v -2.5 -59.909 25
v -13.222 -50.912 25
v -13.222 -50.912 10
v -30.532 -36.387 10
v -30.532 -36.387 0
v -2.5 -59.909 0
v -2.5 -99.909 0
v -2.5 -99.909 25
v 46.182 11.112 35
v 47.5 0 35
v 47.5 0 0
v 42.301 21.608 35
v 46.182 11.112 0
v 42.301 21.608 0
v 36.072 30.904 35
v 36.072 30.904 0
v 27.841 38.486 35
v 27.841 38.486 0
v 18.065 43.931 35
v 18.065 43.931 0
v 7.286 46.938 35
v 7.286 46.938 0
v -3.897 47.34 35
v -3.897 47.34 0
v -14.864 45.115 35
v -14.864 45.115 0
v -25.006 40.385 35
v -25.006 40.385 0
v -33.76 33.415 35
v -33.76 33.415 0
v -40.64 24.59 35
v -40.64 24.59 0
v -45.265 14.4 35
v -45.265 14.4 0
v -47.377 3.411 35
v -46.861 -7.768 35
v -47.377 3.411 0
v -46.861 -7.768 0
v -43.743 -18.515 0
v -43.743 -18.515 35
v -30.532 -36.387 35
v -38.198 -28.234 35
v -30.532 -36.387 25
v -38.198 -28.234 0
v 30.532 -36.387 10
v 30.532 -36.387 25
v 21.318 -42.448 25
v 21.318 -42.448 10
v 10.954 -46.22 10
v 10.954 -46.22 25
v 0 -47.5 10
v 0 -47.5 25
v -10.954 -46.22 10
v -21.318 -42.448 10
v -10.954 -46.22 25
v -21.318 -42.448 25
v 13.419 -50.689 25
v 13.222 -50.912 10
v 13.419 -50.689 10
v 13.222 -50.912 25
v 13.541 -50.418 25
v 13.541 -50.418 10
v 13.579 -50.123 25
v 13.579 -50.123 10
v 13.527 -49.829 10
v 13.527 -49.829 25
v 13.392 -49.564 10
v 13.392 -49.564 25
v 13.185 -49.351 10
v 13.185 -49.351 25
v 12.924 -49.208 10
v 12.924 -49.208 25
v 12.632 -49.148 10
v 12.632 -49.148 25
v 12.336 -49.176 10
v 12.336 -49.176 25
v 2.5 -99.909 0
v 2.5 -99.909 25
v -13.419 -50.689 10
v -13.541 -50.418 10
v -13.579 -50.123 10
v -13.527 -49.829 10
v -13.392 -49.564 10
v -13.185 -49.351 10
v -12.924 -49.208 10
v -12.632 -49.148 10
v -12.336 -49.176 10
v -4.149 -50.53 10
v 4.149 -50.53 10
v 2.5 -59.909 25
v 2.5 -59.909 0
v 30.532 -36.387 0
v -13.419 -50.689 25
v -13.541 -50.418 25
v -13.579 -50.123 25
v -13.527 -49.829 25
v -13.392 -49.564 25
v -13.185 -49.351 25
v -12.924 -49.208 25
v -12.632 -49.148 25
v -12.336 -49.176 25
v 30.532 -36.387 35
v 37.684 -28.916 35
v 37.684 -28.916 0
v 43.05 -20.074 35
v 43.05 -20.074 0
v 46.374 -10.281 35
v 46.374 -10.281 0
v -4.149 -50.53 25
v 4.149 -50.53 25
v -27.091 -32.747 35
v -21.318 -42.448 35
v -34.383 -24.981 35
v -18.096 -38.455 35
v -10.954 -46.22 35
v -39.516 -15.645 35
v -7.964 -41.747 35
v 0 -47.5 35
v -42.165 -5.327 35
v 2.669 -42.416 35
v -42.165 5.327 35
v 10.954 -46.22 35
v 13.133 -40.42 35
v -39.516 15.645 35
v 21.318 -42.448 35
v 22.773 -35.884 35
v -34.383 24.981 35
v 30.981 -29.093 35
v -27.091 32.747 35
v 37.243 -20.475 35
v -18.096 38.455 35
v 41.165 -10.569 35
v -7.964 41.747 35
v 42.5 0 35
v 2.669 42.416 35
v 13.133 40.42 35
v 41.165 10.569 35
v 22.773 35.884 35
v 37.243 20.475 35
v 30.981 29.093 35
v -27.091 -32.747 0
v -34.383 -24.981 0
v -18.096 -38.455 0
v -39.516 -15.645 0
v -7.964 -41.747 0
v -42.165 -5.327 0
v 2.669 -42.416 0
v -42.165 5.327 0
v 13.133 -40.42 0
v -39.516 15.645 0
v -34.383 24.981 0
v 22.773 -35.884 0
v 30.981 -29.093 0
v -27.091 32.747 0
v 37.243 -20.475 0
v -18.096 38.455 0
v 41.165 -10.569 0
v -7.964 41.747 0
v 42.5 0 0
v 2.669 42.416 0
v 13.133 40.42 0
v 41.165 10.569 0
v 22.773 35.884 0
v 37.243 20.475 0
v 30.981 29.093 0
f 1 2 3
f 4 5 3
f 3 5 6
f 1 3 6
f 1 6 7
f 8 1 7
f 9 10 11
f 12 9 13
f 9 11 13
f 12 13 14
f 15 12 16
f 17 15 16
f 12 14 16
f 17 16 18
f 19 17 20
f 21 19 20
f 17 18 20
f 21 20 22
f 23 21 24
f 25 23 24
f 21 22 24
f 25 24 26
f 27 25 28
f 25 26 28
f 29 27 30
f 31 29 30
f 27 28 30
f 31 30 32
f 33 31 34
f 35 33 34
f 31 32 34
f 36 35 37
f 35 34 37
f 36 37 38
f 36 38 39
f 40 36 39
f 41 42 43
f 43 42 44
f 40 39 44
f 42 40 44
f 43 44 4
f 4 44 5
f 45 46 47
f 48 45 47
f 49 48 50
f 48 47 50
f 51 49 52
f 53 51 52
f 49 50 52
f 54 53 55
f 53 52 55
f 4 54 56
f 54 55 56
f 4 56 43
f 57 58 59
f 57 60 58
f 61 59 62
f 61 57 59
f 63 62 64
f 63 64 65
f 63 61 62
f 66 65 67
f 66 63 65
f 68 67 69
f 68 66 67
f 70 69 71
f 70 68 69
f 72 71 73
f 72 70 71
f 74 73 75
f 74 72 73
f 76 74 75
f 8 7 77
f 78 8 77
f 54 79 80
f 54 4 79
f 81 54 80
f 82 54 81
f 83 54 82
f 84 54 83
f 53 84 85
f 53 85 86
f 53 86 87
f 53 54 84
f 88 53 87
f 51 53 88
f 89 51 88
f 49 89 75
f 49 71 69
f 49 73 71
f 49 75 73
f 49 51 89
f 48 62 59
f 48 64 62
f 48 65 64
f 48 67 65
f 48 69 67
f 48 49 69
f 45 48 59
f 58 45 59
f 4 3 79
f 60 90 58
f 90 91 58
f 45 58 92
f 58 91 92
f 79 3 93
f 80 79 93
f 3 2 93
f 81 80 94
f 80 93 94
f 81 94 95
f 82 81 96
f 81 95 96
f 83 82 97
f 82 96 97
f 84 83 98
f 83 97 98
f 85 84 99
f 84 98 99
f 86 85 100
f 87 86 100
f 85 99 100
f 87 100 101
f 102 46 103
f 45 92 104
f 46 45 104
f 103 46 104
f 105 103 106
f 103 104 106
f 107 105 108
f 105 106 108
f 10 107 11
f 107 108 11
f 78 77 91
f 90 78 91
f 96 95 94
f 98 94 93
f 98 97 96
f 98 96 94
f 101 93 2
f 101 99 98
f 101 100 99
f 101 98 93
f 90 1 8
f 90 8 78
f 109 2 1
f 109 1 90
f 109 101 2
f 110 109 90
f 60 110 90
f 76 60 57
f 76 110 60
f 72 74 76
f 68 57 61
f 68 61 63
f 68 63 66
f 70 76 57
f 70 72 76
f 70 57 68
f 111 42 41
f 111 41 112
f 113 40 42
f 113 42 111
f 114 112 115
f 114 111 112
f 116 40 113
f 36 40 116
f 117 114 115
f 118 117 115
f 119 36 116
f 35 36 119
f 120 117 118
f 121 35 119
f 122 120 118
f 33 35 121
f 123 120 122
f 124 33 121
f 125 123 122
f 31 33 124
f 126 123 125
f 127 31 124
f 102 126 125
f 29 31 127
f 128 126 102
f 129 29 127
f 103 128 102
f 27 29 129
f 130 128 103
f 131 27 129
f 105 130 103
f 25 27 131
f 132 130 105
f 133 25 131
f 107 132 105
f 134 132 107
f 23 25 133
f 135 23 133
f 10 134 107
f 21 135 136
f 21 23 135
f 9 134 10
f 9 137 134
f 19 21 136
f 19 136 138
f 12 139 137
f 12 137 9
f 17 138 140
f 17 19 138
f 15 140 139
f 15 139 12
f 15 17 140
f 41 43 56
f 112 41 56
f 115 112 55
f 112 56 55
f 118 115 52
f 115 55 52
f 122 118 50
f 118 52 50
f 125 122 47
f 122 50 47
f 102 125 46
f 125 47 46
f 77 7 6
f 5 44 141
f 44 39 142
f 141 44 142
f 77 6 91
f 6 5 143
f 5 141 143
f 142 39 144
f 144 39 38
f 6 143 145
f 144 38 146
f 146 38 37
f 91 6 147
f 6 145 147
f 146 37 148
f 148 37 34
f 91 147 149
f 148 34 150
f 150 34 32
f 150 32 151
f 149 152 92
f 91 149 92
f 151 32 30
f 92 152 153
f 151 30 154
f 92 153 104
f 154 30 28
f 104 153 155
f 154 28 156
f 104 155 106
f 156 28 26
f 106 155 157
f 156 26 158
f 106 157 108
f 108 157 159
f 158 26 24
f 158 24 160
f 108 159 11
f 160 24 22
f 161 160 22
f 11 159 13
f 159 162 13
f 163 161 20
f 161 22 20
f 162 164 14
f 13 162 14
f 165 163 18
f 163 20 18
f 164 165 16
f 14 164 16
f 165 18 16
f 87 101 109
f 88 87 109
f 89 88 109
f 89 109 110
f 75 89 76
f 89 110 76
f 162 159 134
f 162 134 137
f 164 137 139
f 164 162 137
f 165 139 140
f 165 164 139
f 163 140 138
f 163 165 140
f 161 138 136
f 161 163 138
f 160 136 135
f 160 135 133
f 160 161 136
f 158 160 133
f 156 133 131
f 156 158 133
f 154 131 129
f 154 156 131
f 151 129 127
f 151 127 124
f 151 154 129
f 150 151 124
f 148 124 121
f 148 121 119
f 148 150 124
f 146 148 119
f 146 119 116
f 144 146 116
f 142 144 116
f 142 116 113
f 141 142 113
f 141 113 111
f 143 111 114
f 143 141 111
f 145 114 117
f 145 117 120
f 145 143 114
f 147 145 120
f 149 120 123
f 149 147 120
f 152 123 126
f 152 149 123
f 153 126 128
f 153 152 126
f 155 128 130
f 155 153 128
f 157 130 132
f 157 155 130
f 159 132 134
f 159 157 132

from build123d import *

# Parameters (mm, degrees)
F0_R     = 47.5
F0_R_2   = 42.5
F1_DEPTH = 35
F3_DEPTH = 25
F5_DEPTH = 25
F6_R     = 1


with BuildPart() as f1:
    # F0 (on Top) → F1 (new body)
    with BuildSketch(Plane.XY):
        Circle(F0_R)
        Circle(F0_R_2, mode=Mode.SUBTRACT)
    extrude(amount=F1_DEPTH)

    # F2 (on Top) → F3 (join)
    with BuildSketch(Plane.XY):
        Polygon((0, -47.5), (-30.5324114601, -36.3871110482), (-2.5, -59.9090971653), (-2.5, -99.9090971653), (0, -99.9090971653), (2.5, -99.9090971653), (2.5, -59.9090971653), (30.5324114601, -36.3871110482), align=None)
    extrude(amount=F3_DEPTH)

    # F4 (on face) → F5 (cut)
    with BuildSketch(Plane.XY.offset(35)):
        with BuildLine():
            ThreePointArc((30.5324114601, -36.3871110482), (0, -47.5), (-30.5324114601, -36.3871110482))
            Line((-30.5324114601, -36.3871110482), (-32.5893318111, -38.8384532661))
            ThreePointArc((-32.5893318111, -38.8384532661), (0, -50.7), (32.5893318111, -38.8384532661))
            Line((32.5893318111, -38.8384532661), (30.5324114601, -36.3871110482))
        make_face()
    extrude(amount=-F5_DEPTH, mode=Mode.SUBTRACT)

    # F6
    f6_edges = [f1.edges().sort_by_distance(p)[0] for p in [
        (16.952883, -47.781689, 17.5),
        (-16.952883, -47.781689, 17.5),
    ]]
    fillet(f6_edges, radius=F6_R)


solid = f1.part
